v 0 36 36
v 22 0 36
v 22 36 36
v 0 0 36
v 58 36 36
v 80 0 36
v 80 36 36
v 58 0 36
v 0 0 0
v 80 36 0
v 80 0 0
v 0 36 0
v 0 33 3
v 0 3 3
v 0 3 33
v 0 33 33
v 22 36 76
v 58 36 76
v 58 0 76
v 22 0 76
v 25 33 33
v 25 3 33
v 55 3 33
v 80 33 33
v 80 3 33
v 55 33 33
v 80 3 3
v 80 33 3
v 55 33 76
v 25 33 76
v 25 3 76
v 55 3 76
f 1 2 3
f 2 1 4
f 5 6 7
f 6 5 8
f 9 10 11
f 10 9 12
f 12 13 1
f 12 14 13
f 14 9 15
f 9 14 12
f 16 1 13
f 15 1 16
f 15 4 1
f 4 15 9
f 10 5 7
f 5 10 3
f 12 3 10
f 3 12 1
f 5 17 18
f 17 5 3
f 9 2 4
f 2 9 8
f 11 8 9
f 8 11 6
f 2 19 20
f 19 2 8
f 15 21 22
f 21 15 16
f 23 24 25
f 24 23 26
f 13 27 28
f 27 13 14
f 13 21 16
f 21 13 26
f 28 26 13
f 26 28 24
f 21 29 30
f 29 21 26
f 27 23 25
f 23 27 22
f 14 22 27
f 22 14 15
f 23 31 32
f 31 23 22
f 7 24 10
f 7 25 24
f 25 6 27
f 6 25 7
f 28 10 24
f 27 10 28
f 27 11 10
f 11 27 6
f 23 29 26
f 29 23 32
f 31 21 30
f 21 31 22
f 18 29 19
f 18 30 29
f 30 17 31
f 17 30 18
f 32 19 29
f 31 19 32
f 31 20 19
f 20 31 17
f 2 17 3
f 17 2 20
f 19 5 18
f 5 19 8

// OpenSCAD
/* [Type] */

//Type (3DT needs equal height and width)
type = "T"; //[T,3DT,L,+]

/* [Size] */

//Branch lenth
lenth = 40;

//Branch width
width = 30;

//Branch height
height = 30;

//Thickness
thickness = 3;

if (type == "T") {
	difference(){
		union() {
			branch();
			translate([lenth,0,0]) {
				branch();
			}
		}
		translate([height*-0.5+lenth,thickness,height+thickness]) {
			cube([height,width,thickness]);
		}
	}
		rotate([0,270,0]) {
			translate([height+thickness*2,0,-(height*0.5+thickness+lenth)]) {
				branch();
			}
		}
}

if (type == "L") {
	corner();
	translate([height+thickness*2,0,0]) {
		branch();
	}
	rotate([0,90,0]) {
		translate([-(lenth+height+thickness*2),0,0]) {
			branch();
		}
	}
}

if (type == "+") {
	center();
	translate([height+thickness*2,0,0]) {
		branch();
	}
	rotate([0,90,0]) {
		translate([-(lenth+height+thickness*2),0,0]) {
			branch();
		}
	}
	translate([-lenth,0,0]) {
		branch();
	}
	rotate([0,90,0]) {
		translate([0,0,0]) {
			branch();
		}
	}
}

if (type == "3DT") {
	if (width == height) {
		difference() {
			corner();
			translate([thickness,thickness,thickness]) {
				cube([height,width+thickness,height]);
			}
		}
		translate([height+thickness*2,0,0]) {
			branch();
		}
		rotate([0,90,0]) {
			translate([-(lenth+height+thickness*2),0,0]) {
				branch();
			}
		}
		rotate([0,0,90]) {
			translate([width+thickness*2,-(height+thickness*2),0]) {
				branch();
			}
		}
	}
}

module branch() {
	difference() {
		cube([lenth,width+thickness*2,height+thickness*2]);
		translate([0,thickness,thickness]) {
			cube([lenth,width,height]);
		}
	}
}

module corner() {
	difference() {
		cube([height+thickness*2,width+thickness*2,height+thickness*2]);
		translate([thickness,thickness,thickness]) {
			cube([height+thickness,width,height]);
			cube([height,width,height+thickness]);
		}
	}
}

module center() {
	difference() {
		cube([height+thickness*2,width+thickness*2,height+thickness*2]);
		translate([0,thickness,thickness]) {
			cube([height+thickness*2,width,height]);
		}
		translate([thickness,thickness,0]) {
			cube([height,width,height+thickness*2]);
		}
	}
}
